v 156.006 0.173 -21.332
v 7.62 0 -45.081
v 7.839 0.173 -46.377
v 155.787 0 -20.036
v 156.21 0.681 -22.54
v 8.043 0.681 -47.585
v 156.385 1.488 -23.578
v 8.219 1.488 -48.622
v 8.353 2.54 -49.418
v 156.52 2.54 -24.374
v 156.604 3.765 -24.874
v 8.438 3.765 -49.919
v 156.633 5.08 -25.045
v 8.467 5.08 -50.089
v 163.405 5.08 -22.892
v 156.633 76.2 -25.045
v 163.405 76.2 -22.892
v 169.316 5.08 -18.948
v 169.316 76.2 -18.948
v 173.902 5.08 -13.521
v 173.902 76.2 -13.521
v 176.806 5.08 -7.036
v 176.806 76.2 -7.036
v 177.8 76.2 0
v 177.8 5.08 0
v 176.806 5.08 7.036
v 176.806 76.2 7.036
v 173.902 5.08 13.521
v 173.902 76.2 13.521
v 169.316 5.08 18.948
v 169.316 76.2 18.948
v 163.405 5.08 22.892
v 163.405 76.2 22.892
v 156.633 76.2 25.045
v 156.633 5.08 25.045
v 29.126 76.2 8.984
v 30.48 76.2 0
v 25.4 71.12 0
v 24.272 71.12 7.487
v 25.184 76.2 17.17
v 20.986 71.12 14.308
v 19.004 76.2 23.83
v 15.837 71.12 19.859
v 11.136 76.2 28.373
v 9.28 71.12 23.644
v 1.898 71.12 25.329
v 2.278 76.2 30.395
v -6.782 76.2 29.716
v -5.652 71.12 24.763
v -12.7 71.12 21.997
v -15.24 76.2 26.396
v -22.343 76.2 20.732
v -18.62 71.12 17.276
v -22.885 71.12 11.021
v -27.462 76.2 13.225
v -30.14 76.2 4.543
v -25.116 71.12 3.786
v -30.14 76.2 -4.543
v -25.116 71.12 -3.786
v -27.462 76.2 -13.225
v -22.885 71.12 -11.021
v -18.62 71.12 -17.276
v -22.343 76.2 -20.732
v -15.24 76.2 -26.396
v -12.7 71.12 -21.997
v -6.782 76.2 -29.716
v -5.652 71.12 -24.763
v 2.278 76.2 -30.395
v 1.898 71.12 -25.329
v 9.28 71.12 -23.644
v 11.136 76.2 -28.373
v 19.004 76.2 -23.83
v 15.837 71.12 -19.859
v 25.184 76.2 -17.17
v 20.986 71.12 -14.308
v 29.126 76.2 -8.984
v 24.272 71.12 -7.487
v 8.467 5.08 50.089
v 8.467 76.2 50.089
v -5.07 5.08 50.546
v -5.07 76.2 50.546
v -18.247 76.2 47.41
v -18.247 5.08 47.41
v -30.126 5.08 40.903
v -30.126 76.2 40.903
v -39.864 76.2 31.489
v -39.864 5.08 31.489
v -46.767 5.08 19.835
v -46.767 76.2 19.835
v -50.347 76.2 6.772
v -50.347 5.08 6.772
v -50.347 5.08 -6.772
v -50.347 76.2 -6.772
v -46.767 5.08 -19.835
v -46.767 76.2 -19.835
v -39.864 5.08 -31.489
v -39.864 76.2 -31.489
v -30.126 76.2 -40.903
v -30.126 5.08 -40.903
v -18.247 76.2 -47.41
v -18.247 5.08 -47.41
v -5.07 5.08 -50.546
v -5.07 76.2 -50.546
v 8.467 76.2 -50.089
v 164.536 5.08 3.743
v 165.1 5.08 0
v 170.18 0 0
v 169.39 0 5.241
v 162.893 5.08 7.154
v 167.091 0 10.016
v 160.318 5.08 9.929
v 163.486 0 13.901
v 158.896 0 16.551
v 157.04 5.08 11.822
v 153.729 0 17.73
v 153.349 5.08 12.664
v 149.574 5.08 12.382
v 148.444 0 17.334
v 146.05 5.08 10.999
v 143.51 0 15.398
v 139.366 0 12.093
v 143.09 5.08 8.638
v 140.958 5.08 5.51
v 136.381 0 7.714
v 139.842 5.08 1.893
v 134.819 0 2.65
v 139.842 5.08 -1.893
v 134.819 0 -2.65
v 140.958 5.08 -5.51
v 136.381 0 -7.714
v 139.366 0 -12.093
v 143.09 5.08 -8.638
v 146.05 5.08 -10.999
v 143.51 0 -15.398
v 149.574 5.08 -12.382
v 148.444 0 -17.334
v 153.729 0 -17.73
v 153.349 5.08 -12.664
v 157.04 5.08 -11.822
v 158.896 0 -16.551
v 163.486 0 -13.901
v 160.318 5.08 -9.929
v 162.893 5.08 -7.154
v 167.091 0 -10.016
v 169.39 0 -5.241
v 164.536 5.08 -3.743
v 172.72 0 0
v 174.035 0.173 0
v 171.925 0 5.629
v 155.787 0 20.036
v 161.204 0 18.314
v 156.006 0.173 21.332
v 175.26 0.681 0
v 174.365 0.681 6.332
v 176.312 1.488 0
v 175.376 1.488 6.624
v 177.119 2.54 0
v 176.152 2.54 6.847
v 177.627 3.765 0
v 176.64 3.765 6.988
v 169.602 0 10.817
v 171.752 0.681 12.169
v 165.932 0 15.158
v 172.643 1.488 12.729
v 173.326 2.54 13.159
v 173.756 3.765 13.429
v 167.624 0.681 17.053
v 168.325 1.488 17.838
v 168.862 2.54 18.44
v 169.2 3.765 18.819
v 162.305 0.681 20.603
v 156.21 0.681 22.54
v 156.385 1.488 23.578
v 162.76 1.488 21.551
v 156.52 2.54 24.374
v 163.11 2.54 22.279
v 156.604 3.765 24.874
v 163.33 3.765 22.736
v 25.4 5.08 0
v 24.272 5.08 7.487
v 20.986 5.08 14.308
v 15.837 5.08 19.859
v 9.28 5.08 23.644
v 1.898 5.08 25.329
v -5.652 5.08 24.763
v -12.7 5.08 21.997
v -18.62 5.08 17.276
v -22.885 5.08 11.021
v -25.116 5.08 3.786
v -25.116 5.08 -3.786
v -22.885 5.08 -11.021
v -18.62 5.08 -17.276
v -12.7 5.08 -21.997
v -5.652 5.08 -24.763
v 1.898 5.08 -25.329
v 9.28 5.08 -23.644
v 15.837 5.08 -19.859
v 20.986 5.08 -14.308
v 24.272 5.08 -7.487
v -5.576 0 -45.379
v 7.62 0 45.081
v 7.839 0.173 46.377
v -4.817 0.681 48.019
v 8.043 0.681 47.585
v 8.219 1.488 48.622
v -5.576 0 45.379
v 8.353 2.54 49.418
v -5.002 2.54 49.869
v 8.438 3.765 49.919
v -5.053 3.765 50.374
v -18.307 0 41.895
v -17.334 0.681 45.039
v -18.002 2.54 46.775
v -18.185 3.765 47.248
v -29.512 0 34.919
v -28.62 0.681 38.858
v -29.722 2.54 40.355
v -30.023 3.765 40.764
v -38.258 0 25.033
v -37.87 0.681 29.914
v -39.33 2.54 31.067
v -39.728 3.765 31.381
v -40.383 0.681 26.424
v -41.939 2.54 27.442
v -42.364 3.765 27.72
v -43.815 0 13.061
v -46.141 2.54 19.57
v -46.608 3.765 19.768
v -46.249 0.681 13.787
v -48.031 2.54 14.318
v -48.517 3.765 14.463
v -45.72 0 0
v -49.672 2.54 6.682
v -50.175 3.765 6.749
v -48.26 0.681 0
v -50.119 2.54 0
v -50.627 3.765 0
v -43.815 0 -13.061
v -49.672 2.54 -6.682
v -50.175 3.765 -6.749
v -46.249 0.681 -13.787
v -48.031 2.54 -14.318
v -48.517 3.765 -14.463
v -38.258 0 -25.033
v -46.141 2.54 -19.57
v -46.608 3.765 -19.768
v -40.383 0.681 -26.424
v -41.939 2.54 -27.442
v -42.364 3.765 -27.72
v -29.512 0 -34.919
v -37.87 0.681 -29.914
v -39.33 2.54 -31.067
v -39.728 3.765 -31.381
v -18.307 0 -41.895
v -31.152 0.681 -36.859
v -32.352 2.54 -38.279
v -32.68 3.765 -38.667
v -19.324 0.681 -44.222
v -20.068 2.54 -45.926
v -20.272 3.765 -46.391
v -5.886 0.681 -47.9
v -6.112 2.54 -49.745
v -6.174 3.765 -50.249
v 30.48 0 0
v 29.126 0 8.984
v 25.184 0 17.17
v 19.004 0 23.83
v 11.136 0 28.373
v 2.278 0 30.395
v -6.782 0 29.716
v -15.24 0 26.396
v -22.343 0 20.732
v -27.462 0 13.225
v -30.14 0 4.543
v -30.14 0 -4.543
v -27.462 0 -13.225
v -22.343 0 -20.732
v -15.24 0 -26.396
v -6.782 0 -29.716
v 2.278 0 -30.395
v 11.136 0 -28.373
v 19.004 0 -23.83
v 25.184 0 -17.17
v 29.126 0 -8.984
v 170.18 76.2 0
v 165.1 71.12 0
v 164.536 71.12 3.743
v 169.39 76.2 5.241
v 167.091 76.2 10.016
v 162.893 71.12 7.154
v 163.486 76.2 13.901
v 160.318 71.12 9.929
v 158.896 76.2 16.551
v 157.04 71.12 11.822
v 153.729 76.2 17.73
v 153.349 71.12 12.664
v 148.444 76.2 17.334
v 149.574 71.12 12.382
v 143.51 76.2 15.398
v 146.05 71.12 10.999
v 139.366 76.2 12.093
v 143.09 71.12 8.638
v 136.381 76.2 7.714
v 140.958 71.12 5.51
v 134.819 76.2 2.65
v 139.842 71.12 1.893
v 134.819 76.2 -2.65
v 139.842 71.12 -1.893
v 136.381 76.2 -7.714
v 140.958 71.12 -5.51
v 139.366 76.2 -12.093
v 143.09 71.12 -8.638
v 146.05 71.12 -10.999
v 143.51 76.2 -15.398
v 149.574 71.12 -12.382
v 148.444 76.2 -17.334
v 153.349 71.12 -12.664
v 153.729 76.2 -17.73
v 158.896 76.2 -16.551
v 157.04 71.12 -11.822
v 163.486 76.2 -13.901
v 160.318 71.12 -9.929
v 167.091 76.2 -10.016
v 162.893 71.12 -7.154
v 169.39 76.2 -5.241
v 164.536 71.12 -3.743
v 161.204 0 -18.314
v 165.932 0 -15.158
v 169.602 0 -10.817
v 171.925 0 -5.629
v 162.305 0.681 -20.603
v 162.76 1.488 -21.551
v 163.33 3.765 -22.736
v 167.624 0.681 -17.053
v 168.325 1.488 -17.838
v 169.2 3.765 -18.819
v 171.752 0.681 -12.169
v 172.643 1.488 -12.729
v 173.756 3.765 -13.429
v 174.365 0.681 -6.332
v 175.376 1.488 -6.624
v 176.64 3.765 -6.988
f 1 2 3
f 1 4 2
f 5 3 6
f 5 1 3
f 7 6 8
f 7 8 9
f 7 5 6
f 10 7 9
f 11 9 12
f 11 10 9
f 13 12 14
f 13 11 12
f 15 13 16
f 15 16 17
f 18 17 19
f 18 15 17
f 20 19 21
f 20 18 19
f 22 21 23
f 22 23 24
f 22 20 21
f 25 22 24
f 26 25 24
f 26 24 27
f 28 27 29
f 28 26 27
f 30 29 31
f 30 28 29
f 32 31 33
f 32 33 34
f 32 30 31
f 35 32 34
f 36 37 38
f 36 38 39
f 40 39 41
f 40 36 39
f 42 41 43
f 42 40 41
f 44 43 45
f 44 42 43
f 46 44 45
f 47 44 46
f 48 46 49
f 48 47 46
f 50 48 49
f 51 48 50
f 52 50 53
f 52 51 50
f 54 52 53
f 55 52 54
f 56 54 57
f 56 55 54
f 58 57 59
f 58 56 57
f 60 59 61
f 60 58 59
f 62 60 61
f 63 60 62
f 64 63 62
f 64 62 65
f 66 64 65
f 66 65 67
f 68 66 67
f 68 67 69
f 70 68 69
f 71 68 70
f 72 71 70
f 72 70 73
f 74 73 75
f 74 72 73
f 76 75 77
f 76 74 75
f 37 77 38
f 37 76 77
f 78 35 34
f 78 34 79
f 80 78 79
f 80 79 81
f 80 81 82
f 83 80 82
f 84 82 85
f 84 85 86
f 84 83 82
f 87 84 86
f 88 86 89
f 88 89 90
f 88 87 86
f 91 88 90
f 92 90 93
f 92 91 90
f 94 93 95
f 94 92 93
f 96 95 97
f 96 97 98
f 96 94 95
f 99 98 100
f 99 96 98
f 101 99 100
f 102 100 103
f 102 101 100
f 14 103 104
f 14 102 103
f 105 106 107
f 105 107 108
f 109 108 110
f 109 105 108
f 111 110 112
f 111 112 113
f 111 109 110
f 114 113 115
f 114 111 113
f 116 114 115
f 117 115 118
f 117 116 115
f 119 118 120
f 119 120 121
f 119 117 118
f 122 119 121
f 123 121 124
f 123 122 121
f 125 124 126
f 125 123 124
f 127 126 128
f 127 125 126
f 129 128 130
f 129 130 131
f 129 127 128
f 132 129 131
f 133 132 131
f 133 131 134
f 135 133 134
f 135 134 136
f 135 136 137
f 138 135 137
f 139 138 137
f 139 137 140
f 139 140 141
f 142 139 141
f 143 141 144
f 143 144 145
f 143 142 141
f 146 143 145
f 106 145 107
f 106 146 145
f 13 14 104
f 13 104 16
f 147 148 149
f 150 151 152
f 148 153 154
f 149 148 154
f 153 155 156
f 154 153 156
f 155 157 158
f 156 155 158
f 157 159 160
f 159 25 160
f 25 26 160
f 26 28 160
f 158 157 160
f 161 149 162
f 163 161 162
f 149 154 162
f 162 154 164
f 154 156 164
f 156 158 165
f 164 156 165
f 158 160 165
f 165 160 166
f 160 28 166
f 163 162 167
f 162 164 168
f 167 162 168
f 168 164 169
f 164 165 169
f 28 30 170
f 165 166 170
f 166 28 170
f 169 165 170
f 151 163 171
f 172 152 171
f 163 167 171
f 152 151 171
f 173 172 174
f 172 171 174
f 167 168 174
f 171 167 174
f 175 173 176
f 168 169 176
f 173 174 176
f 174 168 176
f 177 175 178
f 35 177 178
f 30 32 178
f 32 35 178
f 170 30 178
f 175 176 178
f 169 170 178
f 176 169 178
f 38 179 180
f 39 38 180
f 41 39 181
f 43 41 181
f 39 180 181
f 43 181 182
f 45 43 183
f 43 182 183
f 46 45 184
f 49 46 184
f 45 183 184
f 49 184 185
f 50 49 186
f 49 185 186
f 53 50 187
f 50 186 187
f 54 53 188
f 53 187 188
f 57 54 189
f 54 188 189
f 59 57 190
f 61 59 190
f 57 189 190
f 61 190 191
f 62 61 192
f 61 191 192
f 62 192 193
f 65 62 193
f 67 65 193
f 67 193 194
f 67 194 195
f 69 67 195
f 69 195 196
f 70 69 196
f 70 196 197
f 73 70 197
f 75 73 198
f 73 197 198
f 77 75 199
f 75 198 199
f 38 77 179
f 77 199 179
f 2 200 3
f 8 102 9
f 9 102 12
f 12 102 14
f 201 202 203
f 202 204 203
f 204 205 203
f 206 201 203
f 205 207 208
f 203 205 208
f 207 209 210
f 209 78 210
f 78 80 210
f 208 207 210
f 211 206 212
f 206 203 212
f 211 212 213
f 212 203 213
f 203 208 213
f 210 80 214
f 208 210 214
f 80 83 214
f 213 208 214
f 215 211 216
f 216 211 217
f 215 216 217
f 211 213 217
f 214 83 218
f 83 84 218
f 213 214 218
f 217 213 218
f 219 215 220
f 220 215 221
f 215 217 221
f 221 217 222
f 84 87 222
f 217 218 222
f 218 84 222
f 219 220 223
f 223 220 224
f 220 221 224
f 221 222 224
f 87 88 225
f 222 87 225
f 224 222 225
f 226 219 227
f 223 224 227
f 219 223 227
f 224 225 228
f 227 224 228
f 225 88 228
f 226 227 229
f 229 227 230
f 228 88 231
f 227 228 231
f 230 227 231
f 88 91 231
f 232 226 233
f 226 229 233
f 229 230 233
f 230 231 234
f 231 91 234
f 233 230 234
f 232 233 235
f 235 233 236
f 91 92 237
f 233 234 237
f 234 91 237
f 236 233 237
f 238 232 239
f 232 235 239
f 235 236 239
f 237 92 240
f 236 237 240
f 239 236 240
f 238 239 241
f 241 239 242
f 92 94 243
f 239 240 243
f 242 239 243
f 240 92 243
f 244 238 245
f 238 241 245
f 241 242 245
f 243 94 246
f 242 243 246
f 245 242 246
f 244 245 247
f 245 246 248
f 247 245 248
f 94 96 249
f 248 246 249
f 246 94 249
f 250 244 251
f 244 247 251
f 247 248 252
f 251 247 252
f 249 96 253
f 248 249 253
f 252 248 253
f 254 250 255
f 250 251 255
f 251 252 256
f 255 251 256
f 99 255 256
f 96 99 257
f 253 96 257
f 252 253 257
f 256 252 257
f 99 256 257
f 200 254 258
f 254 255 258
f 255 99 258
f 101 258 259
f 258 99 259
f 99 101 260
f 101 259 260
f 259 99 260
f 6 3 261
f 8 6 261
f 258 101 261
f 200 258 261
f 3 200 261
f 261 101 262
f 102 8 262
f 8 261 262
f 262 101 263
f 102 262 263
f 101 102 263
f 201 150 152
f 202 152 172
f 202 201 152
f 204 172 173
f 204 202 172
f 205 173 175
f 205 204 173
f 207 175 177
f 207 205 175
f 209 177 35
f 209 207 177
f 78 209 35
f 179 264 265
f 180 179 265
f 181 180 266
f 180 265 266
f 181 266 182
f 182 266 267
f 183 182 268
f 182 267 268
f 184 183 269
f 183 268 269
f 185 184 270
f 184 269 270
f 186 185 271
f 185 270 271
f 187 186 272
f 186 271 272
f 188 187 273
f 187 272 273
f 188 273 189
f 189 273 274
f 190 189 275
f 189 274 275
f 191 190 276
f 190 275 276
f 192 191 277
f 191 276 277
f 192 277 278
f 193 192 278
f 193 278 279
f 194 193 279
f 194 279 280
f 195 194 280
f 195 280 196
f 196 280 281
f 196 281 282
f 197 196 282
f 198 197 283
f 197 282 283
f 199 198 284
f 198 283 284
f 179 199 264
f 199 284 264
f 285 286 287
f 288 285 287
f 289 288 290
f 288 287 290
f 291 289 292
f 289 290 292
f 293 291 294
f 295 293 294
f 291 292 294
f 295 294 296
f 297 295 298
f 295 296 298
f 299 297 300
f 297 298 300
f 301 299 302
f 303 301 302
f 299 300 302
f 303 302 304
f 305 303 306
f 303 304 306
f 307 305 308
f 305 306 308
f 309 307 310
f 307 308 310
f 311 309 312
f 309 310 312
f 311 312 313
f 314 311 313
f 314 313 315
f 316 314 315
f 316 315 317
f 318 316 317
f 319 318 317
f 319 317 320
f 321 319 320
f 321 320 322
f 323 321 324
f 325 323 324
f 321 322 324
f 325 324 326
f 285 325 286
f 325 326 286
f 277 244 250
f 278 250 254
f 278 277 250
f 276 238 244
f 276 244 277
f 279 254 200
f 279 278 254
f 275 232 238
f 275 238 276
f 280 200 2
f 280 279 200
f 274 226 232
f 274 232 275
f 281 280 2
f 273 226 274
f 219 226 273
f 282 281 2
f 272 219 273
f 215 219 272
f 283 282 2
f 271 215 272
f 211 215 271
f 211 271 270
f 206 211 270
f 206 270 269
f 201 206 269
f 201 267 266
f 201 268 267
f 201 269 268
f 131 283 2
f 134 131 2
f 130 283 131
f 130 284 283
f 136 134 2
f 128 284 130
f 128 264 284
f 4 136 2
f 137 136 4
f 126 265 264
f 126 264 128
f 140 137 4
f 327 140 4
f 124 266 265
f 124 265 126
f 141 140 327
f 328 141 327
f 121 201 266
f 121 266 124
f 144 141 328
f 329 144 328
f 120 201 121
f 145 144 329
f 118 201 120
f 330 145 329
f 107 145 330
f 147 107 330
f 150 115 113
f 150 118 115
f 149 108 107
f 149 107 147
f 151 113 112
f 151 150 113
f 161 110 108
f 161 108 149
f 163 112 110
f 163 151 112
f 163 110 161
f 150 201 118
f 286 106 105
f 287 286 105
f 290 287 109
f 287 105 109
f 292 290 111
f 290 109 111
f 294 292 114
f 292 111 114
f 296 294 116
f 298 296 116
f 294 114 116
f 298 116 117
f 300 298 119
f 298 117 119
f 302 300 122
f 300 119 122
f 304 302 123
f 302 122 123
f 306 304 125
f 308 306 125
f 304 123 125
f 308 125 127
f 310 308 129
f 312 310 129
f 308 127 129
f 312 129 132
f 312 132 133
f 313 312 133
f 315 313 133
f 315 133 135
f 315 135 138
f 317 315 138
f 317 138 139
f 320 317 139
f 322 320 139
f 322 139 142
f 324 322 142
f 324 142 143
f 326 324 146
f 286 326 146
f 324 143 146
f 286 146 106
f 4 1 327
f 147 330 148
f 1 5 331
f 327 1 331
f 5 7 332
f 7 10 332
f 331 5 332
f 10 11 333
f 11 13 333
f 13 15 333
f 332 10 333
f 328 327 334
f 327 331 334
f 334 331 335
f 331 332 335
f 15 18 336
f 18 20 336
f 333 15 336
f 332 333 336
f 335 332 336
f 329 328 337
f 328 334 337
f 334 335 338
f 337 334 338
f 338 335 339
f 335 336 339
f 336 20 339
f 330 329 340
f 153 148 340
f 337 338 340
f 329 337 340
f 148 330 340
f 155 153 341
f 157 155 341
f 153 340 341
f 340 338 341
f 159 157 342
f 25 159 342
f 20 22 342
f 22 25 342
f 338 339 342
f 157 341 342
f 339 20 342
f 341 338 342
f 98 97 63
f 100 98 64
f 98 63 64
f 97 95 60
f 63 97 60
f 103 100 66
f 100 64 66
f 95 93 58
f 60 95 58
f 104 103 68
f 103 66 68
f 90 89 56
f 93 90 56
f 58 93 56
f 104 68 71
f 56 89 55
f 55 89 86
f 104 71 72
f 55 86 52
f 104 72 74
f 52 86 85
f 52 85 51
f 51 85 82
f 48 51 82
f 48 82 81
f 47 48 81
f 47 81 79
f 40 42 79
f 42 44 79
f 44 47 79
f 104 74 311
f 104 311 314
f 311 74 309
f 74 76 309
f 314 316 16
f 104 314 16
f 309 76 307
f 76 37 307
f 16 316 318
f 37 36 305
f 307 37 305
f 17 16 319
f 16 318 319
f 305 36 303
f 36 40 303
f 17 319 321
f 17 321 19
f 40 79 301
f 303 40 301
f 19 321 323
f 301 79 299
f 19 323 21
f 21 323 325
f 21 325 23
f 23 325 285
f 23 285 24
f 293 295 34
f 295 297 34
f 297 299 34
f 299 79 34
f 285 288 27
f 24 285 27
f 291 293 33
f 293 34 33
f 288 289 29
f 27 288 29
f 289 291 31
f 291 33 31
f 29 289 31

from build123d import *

# Parameters (mm, degrees)
F0_R     = 25.4
F0_R_2   = 12.7
F1_DEPTH = 76.2
F2_SIZE  = 5.08
F3_SIZE  = 5.08
F4_R     = 5.08


with BuildPart() as f1:
    # F0 (on Front) → F1 (new body)
    with BuildSketch(Plane.XZ):
        with BuildLine():
            ThreePointArc((8.466667, -50.089475), (38.799141, -32.791259), (50.8, 0))
            ThreePointArc((50.8, 0), (38.799141, 32.791259), (8.466667, 50.089475))
            ThreePointArc((8.466667, 50.089475), (-50.8, 0), (8.466667, -50.089475))
        make_face()
        Circle(F0_R, mode=Mode.SUBTRACT)
        with BuildLine():
            ThreePointArc((8.466667, 50.089475), (38.799141, 32.791259), (50.8, 0))
            ThreePointArc((50.8, 0), (38.799141, -32.791259), (8.466667, -50.089475))
            Line((8.466667, -50.089475), (156.633333, -25.044738))
            ThreePointArc((156.633333, -25.044738), (127, 0), (156.633333, 25.044738))
            Line((156.633333, 25.044738), (8.466667, 50.089475))
        make_face()
        with BuildLine():
            ThreePointArc((177.8, 0), (171.79957, 16.395629), (156.633333, 25.044738))
            ThreePointArc((156.633333, 25.044738), (127, 0), (156.633333, -25.044738))
            ThreePointArc((156.633333, -25.044738), (171.79957, -16.395629), (177.8, 0))
        make_face()
        with Locations((152.4, 0)):
            Circle(F0_R_2, mode=Mode.SUBTRACT)
    extrude(amount=-F1_DEPTH)

    # F2
    f2_edges = [f1.edges().sort_by_distance(p)[0] for p in [
        (-25.4, 0, 0),
        (-25.4, 76.2, 0),
    ]]
    chamfer(f2_edges, length=F2_SIZE)

    # F3
    f3_edges = [f1.edges().sort_by_distance(p)[0] for p in [
        (139.7, 76.2, 0),
        (139.7, 0, 0),
    ]]
    chamfer(f3_edges, length=F3_SIZE)

    # F4
    f4_edges = [f1.edges().sort_by_distance(p)[0] for p in [
        (82.55, 0, -37.567107),
    ]]
    fillet(f4_edges, radius=F4_R)


solid = f1.part
